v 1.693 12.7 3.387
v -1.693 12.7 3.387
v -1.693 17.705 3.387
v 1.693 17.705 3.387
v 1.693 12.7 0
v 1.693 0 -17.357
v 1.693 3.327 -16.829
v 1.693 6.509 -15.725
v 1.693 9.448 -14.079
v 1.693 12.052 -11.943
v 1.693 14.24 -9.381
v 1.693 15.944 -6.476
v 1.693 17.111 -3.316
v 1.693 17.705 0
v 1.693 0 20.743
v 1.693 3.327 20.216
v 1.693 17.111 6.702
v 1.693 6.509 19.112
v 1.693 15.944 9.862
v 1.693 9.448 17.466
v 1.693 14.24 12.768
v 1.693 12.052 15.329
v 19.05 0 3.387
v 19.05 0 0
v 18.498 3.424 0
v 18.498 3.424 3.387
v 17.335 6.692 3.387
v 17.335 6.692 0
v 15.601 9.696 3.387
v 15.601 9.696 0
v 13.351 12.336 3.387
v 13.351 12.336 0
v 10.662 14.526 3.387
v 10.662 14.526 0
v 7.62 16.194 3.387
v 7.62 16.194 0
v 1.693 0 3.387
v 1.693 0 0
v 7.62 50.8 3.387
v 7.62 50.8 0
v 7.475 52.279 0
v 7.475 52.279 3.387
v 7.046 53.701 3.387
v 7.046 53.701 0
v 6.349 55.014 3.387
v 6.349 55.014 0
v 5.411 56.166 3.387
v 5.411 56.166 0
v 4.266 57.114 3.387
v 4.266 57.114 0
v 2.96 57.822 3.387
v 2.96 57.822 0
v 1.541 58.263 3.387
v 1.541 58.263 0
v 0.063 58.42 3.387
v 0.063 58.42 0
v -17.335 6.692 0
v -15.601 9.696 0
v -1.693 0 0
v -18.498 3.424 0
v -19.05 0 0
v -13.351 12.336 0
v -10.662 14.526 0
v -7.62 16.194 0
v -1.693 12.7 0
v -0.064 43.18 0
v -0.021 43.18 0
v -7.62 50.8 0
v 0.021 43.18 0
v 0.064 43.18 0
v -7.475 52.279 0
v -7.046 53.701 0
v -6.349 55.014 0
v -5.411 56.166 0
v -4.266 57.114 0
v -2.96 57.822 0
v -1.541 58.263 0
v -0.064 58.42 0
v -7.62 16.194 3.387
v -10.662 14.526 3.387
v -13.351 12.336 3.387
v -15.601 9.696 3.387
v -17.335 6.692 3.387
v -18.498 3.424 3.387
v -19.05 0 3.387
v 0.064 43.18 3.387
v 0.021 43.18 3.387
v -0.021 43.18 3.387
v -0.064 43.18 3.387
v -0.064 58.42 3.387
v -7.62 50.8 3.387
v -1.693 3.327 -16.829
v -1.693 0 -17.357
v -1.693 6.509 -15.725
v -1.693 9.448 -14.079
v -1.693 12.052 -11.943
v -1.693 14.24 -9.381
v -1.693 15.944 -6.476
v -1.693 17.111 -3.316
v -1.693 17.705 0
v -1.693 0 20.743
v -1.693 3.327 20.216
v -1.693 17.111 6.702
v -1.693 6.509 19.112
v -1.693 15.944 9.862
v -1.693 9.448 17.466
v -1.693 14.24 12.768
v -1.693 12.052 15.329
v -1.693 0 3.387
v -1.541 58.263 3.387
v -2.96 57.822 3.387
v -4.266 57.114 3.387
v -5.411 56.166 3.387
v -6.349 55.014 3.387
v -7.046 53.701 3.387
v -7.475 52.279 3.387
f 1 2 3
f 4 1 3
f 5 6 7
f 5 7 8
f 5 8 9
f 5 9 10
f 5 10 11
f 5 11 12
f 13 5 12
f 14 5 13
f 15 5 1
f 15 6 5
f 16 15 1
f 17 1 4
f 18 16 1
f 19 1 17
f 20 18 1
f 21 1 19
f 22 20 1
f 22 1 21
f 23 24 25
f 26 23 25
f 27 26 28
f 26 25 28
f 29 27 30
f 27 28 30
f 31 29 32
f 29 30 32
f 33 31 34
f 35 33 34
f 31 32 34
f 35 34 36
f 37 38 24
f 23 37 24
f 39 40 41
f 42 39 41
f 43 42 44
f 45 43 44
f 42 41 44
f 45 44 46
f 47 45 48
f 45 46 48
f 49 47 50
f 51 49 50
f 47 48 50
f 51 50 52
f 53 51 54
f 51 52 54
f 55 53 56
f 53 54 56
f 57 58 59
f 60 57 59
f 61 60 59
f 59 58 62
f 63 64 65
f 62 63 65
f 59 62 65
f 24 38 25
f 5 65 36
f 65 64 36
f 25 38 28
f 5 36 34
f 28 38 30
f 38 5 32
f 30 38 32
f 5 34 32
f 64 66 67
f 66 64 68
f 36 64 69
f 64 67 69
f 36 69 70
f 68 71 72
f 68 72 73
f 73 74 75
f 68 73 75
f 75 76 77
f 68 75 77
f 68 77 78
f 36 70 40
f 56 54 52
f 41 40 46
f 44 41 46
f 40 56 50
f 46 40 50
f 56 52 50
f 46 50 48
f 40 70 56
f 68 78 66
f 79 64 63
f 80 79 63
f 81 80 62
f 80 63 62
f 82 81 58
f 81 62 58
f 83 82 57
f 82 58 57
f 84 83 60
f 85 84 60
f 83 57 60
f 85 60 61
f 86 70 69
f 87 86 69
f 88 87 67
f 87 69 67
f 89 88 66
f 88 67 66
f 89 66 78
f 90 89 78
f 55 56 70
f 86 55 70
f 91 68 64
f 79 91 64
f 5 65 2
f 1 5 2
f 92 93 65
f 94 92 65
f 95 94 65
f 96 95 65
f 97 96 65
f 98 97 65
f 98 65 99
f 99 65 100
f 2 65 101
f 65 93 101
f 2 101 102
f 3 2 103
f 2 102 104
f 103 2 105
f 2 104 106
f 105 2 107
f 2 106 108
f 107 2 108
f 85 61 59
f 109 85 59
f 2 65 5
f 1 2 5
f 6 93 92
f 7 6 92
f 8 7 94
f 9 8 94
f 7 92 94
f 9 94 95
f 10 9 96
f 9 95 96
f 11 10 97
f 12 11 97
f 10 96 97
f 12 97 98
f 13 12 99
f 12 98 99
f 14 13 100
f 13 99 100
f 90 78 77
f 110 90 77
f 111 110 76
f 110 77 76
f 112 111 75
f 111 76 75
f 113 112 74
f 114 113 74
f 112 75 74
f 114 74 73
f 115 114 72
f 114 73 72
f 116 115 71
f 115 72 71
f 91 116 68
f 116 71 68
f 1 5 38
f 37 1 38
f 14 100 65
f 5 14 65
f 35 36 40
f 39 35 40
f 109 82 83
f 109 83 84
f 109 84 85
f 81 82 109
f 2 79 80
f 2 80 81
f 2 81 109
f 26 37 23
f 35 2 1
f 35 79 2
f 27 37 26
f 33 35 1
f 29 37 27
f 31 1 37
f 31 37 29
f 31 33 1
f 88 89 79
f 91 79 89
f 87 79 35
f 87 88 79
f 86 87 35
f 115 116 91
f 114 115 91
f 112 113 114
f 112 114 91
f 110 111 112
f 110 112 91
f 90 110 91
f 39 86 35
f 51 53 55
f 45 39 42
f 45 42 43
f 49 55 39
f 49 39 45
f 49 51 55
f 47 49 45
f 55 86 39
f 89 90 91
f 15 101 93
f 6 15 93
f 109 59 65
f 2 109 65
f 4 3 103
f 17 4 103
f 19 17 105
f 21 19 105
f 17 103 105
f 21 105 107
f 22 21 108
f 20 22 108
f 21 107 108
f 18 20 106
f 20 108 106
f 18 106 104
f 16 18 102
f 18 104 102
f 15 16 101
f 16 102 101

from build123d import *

# Parameters (mm, degrees)
F1_DEPTH = 3.3866666667
F2_W     = 12.7
F2_H     = 1.6933333333
F3_DEPTH = 3.3866666667


with BuildPart() as f1:
    # F0 (on Top) → F1 (new body)
    with BuildSketch(Plane.XY):
        with BuildLine():
            Line((-1.6933333333, 12.7), (0, 12.7))
            Line((0, 12.7), (0, 17.78))
            ThreePointArc((0, 17.78), (-3.8916783195, 17.3792277488), (-7.62, 16.1937337648))
            Line((-7.62, 16.1937337648), (-7.62, 0))
            Line((-7.62, 0), (-1.6933333333, 0))
            Line((-1.6933333333, 0), (-1.6933333333, 12.7))
        make_face()
        with BuildLine():
            Line((1.6933333333, 12.7), (1.6933333333, 0))
            Line((1.6933333333, 0), (7.62, 0))
            Line((7.62, 0), (7.62, 16.1937337648))
            ThreePointArc((7.62, 16.1937337648), (3.8916783195, 17.3792277488), (0, 17.78))
            Line((0, 17.78), (0, 12.7))
            Line((0, 12.7), (1.6933333333, 12.7))
        make_face()
        with BuildLine():
            Line((7.62, 16.1937337648), (7.62, 0))
            Line((7.62, 0), (19.05, 0))
            ThreePointArc((19.05, 0), (15.6006883922, 9.6960544879), (7.62, 16.1937337648))
        make_face()
        with BuildLine():
            Line((-19.05, 0), (-7.62, 0))
            Line((-7.62, 0), (-7.62, 16.1937337648))
            ThreePointArc((-7.62, 16.1937337648), (-15.6006883922, 9.6960544879), (-19.05, 0))
        make_face()
        with BuildLine():
            ThreePointArc((0.0635, 43.1802645879), (5.4105577347, 45.4343439357), (7.62, 50.8))
            ThreePointArc((7.62, 50.8), (5.4105577347, 56.1656560643), (0.0635, 58.4197354121))
            Line((0.0635, 58.4197354121), (0.0635, 50.8))
            Line((0.0635, 50.8), (0.0635, 43.1802645879))
        make_face()
        with BuildLine():
            ThreePointArc((-0.0635, 58.4197354121), (-5.4105577347, 56.1656560643), (-7.62, 50.8))
            ThreePointArc((-7.62, 50.8), (-5.4105577347, 45.4343439357), (-0.0635, 43.1802645879))
            Line((-0.0635, 43.1802645879), (-0.0635, 50.8))
            Line((-0.0635, 50.8), (-0.0635, 58.4197354121))
        make_face()
        with BuildLine():
            ThreePointArc((-7.62, 16.1937337648), (-3.8916783195, 17.3792277488), (0, 17.78))
            ThreePointArc((0, 17.78), (3.8916783195, 17.3792277488), (7.62, 16.1937337648))
            Line((7.62, 16.1937337648), (7.62, 50.8))
            ThreePointArc((7.62, 50.8), (5.4105577347, 45.4343439357), (0.0635, 43.1802645879))
            ThreePointArc((0.0635, 43.1802645879), (0, 43.18), (-0.0635, 43.1802645879))
            ThreePointArc((-0.0635, 43.1802645879), (-5.4105577347, 45.4343439357), (-7.62, 50.8))
            Line((-7.62, 50.8), (-7.62, 16.1937337648))
        make_face()
    extrude(amount=F1_DEPTH)


with BuildPart() as f3:
    # F2 (on face) → F3 (new body)
    with BuildSketch(Plane.YZ.offset(-1.6933333333)):
        with BuildLine():
            Line((0, 20.7433333333), (0, 3.3866666667))
            Line((0, 3.3866666667), (12.7, 3.3866666667))
            Line((12.7, 3.3866666667), (17.7047713172, 3.3866666667))
            ThreePointArc((17.7047713172, 3.3866666667), (12.0523824986, 15.3291758556), (0, 20.7433333333))
        make_face()
        with BuildLine():
            Line((12.7, 0), (0, 0))
            Line((0, 0), (0, -17.3566666667))
            ThreePointArc((0, -17.3566666667), (12.0523824986, -11.942509189), (17.7047713172, 0))
            Line((17.7047713172, 0), (12.7, 0))
        make_face()
        with Locations((6.35, 0.8466666667)):
            Rectangle(F2_W, F2_H)
        with Locations((6.35, 2.54)):
            Rectangle(F2_W, F2_H)
    extrude(amount=F3_DEPTH)


solid = Compound([f1.part, f3.part])
